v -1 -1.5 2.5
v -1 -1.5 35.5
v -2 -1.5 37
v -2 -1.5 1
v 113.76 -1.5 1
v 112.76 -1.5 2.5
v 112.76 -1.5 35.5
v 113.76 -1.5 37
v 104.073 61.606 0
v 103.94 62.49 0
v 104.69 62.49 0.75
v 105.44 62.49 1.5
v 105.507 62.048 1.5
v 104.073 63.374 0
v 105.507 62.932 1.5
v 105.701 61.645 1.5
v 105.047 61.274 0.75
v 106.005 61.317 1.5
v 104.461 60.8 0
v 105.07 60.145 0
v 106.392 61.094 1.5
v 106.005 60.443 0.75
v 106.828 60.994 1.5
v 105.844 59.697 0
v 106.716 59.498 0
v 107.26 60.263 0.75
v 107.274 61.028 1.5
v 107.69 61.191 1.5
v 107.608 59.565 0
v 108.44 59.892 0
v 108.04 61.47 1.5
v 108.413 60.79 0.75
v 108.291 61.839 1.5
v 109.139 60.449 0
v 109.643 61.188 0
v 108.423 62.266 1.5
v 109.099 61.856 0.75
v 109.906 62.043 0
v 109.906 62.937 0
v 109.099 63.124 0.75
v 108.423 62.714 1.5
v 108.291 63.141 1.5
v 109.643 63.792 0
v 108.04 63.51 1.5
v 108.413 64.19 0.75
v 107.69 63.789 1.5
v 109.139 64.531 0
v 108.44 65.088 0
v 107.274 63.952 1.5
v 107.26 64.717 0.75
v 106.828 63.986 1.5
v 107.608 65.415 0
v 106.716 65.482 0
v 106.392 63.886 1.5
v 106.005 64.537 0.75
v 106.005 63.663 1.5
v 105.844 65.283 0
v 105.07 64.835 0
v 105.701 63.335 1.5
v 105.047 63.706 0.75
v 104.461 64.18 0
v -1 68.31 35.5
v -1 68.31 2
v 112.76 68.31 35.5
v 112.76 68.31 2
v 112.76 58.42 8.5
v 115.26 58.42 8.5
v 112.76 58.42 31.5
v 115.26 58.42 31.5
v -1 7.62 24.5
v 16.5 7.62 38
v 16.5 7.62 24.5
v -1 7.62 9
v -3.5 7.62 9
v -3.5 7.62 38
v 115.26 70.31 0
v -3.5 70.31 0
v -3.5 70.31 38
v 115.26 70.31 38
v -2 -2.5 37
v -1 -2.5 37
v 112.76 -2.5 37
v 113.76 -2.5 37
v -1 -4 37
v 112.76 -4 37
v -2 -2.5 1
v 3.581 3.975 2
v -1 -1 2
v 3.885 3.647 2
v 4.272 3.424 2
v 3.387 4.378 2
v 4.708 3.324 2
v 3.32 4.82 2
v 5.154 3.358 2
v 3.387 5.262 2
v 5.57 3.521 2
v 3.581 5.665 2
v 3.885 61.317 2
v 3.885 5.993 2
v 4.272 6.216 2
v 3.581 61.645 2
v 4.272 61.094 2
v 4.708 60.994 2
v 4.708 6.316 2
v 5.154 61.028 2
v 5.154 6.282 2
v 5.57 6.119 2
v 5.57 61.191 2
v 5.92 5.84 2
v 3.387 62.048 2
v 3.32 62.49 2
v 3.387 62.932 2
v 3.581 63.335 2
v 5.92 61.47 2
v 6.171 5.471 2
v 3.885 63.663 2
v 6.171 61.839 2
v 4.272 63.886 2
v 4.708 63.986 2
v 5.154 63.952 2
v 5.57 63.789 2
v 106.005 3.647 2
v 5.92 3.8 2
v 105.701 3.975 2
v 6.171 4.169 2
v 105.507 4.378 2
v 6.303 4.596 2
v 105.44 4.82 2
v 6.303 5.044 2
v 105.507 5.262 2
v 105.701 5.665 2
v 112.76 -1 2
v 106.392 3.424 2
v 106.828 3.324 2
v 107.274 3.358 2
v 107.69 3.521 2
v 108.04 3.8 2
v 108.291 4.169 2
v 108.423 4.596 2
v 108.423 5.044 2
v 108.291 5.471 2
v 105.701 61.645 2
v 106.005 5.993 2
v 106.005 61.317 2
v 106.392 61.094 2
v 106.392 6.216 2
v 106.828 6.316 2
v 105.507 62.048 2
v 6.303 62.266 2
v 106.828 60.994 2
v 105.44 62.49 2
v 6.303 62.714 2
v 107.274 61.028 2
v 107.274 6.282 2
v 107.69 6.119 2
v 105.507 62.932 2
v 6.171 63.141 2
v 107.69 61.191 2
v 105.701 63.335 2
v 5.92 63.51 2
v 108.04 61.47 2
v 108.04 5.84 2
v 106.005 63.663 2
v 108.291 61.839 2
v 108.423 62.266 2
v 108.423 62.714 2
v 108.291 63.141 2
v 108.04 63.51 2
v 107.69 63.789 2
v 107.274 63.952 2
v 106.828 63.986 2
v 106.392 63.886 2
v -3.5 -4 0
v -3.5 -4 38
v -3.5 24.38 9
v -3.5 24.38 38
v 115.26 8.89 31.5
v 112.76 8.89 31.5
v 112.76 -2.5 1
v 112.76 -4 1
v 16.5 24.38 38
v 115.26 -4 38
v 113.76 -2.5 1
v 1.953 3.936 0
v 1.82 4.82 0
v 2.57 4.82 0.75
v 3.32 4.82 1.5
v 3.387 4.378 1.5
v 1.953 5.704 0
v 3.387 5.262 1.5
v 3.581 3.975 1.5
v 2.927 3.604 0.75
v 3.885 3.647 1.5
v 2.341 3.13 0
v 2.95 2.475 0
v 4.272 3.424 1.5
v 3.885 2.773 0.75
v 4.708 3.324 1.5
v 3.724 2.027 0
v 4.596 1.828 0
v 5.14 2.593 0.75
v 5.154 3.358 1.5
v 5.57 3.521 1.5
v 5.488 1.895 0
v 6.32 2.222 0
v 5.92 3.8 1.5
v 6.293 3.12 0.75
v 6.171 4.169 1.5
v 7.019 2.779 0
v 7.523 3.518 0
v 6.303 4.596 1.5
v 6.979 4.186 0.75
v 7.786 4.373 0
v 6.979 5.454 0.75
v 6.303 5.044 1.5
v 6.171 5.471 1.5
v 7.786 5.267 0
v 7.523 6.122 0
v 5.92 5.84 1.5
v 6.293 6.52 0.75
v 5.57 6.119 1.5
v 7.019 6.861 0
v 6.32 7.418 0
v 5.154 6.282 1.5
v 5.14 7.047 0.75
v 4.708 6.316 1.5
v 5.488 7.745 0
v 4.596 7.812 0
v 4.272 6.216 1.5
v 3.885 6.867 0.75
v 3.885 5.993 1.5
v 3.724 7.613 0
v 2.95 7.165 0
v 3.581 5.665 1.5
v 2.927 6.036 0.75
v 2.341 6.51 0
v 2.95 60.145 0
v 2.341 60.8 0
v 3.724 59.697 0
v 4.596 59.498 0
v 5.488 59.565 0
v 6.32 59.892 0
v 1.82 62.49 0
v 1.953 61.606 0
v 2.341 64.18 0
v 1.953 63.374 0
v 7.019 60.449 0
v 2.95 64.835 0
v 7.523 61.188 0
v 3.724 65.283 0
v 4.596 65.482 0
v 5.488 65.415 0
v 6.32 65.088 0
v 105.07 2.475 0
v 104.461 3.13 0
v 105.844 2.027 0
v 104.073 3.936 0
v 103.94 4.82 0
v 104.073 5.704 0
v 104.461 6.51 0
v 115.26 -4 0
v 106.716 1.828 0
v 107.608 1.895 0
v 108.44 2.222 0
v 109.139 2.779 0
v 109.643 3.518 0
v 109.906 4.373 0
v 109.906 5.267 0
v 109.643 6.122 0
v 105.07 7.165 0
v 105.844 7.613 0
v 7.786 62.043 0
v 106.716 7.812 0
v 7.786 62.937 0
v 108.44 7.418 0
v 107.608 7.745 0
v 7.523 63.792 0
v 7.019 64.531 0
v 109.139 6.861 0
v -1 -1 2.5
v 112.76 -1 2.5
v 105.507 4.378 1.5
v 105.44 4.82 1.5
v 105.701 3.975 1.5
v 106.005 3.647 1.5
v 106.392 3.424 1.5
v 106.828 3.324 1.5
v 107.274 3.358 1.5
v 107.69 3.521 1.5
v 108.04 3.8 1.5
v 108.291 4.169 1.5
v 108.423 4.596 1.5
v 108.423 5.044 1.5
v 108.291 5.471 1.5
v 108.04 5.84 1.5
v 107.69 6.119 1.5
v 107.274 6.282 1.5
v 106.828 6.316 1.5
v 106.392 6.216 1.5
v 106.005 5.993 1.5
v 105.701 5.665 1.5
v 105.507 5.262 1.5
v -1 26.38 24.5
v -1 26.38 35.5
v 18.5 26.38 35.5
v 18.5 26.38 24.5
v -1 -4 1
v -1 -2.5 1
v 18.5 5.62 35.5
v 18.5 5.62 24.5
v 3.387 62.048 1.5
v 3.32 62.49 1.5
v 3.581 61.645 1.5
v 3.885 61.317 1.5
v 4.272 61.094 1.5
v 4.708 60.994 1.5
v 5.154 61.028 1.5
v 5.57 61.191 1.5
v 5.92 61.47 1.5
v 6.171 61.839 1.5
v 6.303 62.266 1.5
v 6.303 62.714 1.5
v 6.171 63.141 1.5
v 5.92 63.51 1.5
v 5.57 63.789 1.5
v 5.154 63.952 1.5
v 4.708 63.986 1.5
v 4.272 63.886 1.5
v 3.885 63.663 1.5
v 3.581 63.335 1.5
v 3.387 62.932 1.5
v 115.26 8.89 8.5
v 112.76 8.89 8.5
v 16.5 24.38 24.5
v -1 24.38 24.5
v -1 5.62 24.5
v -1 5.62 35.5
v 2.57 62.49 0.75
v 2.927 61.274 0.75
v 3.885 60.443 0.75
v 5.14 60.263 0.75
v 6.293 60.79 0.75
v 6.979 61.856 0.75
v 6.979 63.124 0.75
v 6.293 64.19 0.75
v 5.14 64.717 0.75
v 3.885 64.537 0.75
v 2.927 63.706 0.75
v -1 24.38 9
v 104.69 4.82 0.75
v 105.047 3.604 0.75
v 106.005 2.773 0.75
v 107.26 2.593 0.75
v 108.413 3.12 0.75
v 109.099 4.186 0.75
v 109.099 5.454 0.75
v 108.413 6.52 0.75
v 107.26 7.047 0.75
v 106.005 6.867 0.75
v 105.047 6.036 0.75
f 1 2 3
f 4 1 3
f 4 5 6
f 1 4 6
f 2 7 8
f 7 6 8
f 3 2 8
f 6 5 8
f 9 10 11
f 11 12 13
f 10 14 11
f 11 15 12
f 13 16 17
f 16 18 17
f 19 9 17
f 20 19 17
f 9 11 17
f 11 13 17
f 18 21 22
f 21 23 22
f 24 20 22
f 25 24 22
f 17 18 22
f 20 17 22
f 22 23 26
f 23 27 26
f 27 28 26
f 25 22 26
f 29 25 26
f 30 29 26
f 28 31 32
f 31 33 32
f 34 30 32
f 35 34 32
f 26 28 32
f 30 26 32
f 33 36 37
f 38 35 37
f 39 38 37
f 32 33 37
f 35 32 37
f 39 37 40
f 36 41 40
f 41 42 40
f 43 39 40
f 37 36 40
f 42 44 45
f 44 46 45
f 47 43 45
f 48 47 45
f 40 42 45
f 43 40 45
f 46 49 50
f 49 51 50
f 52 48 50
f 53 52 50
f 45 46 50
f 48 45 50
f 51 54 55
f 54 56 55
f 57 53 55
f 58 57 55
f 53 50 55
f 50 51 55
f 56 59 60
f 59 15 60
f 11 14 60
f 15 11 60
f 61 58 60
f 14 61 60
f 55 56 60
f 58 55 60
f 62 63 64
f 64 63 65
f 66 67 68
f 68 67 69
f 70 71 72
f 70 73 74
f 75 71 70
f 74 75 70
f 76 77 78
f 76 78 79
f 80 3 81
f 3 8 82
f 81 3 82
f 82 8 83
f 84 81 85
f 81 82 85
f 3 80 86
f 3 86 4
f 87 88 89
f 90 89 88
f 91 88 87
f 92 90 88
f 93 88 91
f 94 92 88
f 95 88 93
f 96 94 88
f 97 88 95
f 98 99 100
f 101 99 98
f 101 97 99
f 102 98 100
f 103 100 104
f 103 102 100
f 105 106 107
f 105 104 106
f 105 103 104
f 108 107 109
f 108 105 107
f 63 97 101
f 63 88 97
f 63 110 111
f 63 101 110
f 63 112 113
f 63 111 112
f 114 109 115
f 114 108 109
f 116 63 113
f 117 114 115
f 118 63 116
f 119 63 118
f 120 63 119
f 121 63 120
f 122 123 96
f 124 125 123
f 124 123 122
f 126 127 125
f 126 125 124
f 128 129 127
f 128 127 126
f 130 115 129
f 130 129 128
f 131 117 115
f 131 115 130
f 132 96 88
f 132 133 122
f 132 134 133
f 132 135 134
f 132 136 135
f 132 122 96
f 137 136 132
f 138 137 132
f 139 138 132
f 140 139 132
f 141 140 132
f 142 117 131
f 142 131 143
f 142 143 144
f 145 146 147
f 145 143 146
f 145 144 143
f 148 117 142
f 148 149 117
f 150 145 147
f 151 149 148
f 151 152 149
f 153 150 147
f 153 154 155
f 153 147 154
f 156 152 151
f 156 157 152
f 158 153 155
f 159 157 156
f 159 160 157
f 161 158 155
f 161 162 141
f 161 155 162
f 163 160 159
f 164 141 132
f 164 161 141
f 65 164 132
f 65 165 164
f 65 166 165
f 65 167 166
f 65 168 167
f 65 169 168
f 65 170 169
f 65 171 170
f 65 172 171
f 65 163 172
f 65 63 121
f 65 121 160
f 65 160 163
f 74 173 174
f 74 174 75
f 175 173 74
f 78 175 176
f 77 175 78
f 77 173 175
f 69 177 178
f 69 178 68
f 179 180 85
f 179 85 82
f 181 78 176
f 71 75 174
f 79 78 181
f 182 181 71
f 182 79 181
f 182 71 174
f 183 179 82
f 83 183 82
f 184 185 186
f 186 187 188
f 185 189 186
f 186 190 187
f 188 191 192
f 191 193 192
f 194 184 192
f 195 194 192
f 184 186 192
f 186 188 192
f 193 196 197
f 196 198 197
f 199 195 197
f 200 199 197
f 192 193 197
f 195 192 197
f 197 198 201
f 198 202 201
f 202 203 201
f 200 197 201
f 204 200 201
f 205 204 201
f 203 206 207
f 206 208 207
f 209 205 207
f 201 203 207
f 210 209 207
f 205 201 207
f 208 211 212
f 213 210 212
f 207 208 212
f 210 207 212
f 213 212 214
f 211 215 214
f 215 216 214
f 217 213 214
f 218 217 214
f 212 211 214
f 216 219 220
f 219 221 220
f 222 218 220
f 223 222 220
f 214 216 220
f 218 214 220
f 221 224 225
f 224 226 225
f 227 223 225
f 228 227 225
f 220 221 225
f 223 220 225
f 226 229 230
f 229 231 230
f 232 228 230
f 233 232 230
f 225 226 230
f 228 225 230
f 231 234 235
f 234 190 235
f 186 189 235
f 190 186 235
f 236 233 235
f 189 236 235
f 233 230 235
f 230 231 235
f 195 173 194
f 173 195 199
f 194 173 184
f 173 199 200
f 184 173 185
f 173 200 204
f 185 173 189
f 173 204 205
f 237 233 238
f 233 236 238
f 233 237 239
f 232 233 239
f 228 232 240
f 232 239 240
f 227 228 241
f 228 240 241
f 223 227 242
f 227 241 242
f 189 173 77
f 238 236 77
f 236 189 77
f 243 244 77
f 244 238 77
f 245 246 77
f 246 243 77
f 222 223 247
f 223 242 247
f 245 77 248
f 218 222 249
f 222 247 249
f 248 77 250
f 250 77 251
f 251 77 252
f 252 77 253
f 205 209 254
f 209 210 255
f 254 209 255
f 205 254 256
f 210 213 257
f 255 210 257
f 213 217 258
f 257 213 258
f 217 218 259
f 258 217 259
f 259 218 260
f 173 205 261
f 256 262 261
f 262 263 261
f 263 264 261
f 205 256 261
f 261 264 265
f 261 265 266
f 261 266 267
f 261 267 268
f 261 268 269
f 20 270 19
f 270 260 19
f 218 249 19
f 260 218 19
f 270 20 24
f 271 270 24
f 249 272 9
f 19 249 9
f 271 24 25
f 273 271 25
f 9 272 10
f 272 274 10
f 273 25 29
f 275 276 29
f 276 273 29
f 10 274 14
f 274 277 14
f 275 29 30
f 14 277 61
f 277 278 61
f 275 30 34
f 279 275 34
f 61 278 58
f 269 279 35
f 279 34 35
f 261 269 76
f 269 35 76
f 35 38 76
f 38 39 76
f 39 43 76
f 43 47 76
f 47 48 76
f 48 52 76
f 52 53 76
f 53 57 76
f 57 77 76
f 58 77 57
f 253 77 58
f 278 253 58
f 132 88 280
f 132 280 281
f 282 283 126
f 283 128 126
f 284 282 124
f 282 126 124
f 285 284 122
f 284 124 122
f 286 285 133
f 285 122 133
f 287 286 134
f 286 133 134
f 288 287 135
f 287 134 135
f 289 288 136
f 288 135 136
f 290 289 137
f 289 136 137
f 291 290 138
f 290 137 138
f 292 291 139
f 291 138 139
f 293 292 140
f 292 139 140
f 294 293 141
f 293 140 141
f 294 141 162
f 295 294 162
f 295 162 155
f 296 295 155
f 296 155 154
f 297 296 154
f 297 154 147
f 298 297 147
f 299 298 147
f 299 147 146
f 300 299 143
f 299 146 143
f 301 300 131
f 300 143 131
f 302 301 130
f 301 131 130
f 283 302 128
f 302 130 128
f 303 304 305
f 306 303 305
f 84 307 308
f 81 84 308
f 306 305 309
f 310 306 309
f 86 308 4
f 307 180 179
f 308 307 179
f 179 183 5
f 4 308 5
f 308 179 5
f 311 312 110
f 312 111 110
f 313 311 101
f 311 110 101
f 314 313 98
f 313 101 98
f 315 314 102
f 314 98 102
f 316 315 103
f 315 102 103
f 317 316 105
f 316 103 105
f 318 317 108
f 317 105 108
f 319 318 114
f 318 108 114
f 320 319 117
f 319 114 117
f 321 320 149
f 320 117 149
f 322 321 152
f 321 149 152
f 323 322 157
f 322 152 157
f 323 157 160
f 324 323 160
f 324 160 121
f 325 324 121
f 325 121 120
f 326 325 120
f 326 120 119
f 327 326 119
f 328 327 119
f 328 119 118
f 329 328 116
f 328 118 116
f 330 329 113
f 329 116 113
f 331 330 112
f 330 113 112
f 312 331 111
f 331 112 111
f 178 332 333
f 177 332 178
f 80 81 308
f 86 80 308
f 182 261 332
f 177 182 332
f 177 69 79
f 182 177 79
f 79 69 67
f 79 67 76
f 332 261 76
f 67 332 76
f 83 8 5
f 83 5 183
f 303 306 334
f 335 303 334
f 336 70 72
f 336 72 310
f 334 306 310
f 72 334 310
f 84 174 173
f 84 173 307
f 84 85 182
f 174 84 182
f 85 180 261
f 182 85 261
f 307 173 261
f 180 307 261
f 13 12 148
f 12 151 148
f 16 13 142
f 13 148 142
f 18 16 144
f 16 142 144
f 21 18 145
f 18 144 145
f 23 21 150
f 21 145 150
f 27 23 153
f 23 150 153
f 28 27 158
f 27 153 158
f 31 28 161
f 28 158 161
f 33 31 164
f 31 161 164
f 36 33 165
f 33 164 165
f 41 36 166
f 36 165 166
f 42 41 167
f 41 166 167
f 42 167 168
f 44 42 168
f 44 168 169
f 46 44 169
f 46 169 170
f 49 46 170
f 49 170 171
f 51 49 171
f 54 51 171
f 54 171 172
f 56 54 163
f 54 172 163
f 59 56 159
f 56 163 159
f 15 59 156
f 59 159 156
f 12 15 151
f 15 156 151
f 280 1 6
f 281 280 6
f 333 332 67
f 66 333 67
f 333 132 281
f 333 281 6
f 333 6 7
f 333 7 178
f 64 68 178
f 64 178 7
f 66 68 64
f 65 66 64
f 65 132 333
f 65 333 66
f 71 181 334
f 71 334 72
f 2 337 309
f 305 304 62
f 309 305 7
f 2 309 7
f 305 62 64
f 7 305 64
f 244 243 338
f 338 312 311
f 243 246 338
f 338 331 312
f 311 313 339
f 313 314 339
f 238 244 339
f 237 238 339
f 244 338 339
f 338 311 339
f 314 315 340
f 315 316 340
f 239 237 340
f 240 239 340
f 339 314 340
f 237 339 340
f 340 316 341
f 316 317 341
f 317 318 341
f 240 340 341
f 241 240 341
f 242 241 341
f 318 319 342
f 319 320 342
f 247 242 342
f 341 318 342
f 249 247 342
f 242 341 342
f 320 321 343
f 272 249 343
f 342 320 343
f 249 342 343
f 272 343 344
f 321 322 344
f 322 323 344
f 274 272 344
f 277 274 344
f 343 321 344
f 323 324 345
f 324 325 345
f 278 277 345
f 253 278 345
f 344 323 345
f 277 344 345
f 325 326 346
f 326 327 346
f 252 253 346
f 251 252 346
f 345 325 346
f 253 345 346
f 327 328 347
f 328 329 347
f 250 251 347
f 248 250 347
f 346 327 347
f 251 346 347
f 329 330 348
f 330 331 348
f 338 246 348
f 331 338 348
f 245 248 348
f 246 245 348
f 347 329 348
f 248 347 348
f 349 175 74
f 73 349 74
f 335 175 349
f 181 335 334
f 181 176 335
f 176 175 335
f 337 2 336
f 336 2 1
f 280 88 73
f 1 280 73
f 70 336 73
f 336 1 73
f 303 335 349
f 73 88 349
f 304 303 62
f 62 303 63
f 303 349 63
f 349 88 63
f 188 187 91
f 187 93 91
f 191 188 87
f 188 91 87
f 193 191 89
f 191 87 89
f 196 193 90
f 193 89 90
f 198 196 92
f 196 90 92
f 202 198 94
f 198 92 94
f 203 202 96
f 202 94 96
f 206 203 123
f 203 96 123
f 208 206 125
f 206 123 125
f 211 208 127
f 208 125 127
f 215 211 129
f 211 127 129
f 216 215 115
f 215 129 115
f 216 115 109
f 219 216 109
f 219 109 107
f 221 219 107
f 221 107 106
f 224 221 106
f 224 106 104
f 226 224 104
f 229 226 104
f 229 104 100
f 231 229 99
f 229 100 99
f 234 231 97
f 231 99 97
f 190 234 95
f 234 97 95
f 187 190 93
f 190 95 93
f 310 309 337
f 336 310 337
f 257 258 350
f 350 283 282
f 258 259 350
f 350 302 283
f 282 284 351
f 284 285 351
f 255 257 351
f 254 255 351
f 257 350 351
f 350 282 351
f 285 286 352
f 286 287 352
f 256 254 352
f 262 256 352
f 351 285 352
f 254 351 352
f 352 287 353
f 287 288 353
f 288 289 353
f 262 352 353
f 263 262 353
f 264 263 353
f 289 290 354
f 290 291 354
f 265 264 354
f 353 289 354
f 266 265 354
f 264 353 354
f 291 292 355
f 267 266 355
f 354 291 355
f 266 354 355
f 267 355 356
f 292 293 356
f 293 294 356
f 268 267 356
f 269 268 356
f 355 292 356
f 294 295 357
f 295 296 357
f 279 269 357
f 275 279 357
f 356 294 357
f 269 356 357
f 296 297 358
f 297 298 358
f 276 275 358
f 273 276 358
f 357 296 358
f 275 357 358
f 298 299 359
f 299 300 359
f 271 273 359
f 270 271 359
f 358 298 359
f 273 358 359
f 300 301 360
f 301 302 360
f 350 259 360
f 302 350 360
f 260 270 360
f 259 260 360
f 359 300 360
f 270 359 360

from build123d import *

# Parameters (mm, degrees)
F0_W            = 113.76
F0_H            = 69.31
F0_R            = 3
F0_R_2          = 1.5
F1_DEPTH        = 2
F0_W_2          = 118.76
F0_H_2          = 74.31
F2_DEPTH        = 38
F3_W            = 49.53
F3_H            = 23
F4_DEPTH        = 2.5
F5_W            = 16.76
F5_H            = 29
F6_DEPTH        = 2.5
F8_DEPTH        = 2.5
F9_W            = 19.5
F9_H            = 11
F10_DEPTH       = 2
F11_W           = 19.5
F11_H           = 11
F12_DEPTH       = 2
F13_W           = 16.76
F13_H           = 13.5
F14_DEPTH       = 2
F15_W           = 113.76
F15_H           = 33
F16_DEPTH       = 3
F17_W           = 113.76
F17_H           = 1.5
F18_DEPTH       = 2.5
F20_DEPTH       = 1
F22_DEPTH       = 1
F23_D           = 3
F23_DEPTH       = 5
F23_CSINK_D     = 6
F23_CSINK_ANGLE = 90
F23_TIP         = 0.9012909285


with BuildPart() as f1:
    # F0 (on Top) → F1 (new body)
    with BuildSketch(Plane.XY):
        with Locations((55.88, 33.655)):
            Rectangle(F0_W, F0_H)
        with Locations((4.82, 4.82)):
            Circle(F0_R, mode=Mode.SUBTRACT)
        with Locations((106.94, 4.82)):
            Circle(F0_R, mode=Mode.SUBTRACT)
        with Locations((4.82, 62.49)):
            Circle(F0_R, mode=Mode.SUBTRACT)
        with Locations((106.94, 62.49)):
            Circle(F0_R, mode=Mode.SUBTRACT)
        with Locations((106.94, 62.49)):
            Circle(F0_R)
        with Locations((106.94, 62.49)):
            Circle(F0_R_2, mode=Mode.SUBTRACT)
        with Locations((106.94, 62.49)):
            Circle(F0_R_2)
        with Locations((106.94, 4.82)):
            Circle(F0_R)
        with Locations((106.94, 4.82)):
            Circle(F0_R_2, mode=Mode.SUBTRACT)
        with Locations((106.94, 4.82)):
            Circle(F0_R_2)
        with Locations((4.82, 4.82)):
            Circle(F0_R)
        with Locations((4.82, 4.82)):
            Circle(F0_R_2, mode=Mode.SUBTRACT)
        with Locations((4.82, 4.82)):
            Circle(F0_R_2)
        with Locations((4.82, 62.49)):
            Circle(F0_R)
        with Locations((4.82, 62.49)):
            Circle(F0_R_2, mode=Mode.SUBTRACT)
        with Locations((4.82, 62.49)):
            Circle(F0_R_2)
    extrude(amount=F1_DEPTH)

    # F0 (on Top) → F2 (join)
    with BuildSketch(Plane.XY):
        with Locations((55.88, 33.155)):
            Rectangle(F0_W_2, F0_H_2)
        with Locations((55.88, 33.655)):
            Rectangle(F0_W, F0_H, mode=Mode.SUBTRACT)
    extrude(amount=F2_DEPTH)

    # F3 (on face) → F4 (cut, through all)
    with BuildSketch(Plane.YZ.offset(115.26)):
        with Locations((33.655, 20)):
            Rectangle(F3_W, F3_H)
    extrude(amount=-F4_DEPTH, mode=Mode.SUBTRACT)

    # F5 (on face) → F6 (cut, through all)
    with BuildSketch(Plane(origin=(-3.5, 0, 0), x_dir=(0, -1, 0), z_dir=(-1, 0, 0))):
        with Locations((-16, 23.5)):
            Rectangle(F5_W, F5_H)
    extrude(amount=-F6_DEPTH, mode=Mode.SUBTRACT)

    # F7 (on face) → F8 (join)
    with BuildSketch(Plane.XY.offset(38)):
        Polygon((-1, 7.62), (-1, -1), (112.76, -1), (112.76, 68.31), (-1, 68.31), (-1, 24.38), (18.5, 24.38), (18.5, 7.62), align=None)
    extrude(amount=-F8_DEPTH)

    # F9 (on face) → F10 (join)
    with BuildSketch(Plane.XZ.offset(-24.38)):
        with Locations((8.75, 30)):
            Rectangle(F9_W, F9_H)
    extrude(amount=-F10_DEPTH)

    # F11 (on face) → F12 (join)
    with BuildSketch(Plane(origin=(0, 7.62, 0), x_dir=(-1, 0, 0), z_dir=(0, 1, 0))):
        with Locations((-8.75, 30)):
            Rectangle(F11_W, F11_H)
    extrude(amount=-F12_DEPTH)

    # F13 (on face) → F14 (join)
    with BuildSketch(Plane(origin=(18.5, 0, 0), x_dir=(0, -1, 0), z_dir=(-1, 0, 0))):
        with Locations((-16, 31.25)):
            Rectangle(F13_W, F13_H)
    extrude(amount=F14_DEPTH)

    # F15 (on face) → F16 (cut, through all)
    with BuildSketch(Plane.XZ.offset(4)):
        with Locations((55.88, 19)):
            Rectangle(F15_W, F15_H)
    extrude(amount=-F16_DEPTH, mode=Mode.SUBTRACT)

    # F17 (on face) → F18 (cut)
    with BuildSketch(Plane.XZ.offset(4)):
        with Locations((55.88, 36.25)):
            Rectangle(F17_W, F17_H)
        with Locations((55.88, 1.75)):
            Rectangle(F17_W, F17_H)
    extrude(amount=-F18_DEPTH, mode=Mode.SUBTRACT)

    # F19 (on face) → F20 (cut)
    with BuildSketch(Plane.YZ.offset(-1)):
        Polygon((-1.5, 35.5), (-1.5, 37), (-2.5, 37), (-2.5, 1), (-1.5, 1), (-1.5, 2.5), align=None)
    extrude(amount=-F20_DEPTH, mode=Mode.SUBTRACT)

    # F21 (on face) → F22 (cut)
    with BuildSketch(Plane(origin=(112.76, 0, 0), x_dir=(0, -1, 0), z_dir=(-1, 0, 0))):
        Polygon((2.5, 37), (1.5, 37), (1.5, 35.5), (1.5, 2.5), (1.5, 1), (2.5, 1), align=None)
    extrude(amount=-F22_DEPTH, mode=Mode.SUBTRACT)

    # F23
    with Locations(Plane(origin=(0, 0, 0), x_dir=(1, 0, 0), z_dir=(0, 0, -1))):
        with Locations((4.82, -4.82), (106.94, -4.82), (106.94, -62.49), (4.82, -62.49)):
            CounterSinkHole(F23_D / 2, F23_CSINK_D / 2, depth=F23_DEPTH, counter_sink_angle=F23_CSINK_ANGLE)
            with Locations((0, 0, -(F23_DEPTH + F23_TIP / 2))):  # 118° drill point
                Cone(0, F23_D / 2, F23_TIP, mode=Mode.SUBTRACT)


solid = f1.part
